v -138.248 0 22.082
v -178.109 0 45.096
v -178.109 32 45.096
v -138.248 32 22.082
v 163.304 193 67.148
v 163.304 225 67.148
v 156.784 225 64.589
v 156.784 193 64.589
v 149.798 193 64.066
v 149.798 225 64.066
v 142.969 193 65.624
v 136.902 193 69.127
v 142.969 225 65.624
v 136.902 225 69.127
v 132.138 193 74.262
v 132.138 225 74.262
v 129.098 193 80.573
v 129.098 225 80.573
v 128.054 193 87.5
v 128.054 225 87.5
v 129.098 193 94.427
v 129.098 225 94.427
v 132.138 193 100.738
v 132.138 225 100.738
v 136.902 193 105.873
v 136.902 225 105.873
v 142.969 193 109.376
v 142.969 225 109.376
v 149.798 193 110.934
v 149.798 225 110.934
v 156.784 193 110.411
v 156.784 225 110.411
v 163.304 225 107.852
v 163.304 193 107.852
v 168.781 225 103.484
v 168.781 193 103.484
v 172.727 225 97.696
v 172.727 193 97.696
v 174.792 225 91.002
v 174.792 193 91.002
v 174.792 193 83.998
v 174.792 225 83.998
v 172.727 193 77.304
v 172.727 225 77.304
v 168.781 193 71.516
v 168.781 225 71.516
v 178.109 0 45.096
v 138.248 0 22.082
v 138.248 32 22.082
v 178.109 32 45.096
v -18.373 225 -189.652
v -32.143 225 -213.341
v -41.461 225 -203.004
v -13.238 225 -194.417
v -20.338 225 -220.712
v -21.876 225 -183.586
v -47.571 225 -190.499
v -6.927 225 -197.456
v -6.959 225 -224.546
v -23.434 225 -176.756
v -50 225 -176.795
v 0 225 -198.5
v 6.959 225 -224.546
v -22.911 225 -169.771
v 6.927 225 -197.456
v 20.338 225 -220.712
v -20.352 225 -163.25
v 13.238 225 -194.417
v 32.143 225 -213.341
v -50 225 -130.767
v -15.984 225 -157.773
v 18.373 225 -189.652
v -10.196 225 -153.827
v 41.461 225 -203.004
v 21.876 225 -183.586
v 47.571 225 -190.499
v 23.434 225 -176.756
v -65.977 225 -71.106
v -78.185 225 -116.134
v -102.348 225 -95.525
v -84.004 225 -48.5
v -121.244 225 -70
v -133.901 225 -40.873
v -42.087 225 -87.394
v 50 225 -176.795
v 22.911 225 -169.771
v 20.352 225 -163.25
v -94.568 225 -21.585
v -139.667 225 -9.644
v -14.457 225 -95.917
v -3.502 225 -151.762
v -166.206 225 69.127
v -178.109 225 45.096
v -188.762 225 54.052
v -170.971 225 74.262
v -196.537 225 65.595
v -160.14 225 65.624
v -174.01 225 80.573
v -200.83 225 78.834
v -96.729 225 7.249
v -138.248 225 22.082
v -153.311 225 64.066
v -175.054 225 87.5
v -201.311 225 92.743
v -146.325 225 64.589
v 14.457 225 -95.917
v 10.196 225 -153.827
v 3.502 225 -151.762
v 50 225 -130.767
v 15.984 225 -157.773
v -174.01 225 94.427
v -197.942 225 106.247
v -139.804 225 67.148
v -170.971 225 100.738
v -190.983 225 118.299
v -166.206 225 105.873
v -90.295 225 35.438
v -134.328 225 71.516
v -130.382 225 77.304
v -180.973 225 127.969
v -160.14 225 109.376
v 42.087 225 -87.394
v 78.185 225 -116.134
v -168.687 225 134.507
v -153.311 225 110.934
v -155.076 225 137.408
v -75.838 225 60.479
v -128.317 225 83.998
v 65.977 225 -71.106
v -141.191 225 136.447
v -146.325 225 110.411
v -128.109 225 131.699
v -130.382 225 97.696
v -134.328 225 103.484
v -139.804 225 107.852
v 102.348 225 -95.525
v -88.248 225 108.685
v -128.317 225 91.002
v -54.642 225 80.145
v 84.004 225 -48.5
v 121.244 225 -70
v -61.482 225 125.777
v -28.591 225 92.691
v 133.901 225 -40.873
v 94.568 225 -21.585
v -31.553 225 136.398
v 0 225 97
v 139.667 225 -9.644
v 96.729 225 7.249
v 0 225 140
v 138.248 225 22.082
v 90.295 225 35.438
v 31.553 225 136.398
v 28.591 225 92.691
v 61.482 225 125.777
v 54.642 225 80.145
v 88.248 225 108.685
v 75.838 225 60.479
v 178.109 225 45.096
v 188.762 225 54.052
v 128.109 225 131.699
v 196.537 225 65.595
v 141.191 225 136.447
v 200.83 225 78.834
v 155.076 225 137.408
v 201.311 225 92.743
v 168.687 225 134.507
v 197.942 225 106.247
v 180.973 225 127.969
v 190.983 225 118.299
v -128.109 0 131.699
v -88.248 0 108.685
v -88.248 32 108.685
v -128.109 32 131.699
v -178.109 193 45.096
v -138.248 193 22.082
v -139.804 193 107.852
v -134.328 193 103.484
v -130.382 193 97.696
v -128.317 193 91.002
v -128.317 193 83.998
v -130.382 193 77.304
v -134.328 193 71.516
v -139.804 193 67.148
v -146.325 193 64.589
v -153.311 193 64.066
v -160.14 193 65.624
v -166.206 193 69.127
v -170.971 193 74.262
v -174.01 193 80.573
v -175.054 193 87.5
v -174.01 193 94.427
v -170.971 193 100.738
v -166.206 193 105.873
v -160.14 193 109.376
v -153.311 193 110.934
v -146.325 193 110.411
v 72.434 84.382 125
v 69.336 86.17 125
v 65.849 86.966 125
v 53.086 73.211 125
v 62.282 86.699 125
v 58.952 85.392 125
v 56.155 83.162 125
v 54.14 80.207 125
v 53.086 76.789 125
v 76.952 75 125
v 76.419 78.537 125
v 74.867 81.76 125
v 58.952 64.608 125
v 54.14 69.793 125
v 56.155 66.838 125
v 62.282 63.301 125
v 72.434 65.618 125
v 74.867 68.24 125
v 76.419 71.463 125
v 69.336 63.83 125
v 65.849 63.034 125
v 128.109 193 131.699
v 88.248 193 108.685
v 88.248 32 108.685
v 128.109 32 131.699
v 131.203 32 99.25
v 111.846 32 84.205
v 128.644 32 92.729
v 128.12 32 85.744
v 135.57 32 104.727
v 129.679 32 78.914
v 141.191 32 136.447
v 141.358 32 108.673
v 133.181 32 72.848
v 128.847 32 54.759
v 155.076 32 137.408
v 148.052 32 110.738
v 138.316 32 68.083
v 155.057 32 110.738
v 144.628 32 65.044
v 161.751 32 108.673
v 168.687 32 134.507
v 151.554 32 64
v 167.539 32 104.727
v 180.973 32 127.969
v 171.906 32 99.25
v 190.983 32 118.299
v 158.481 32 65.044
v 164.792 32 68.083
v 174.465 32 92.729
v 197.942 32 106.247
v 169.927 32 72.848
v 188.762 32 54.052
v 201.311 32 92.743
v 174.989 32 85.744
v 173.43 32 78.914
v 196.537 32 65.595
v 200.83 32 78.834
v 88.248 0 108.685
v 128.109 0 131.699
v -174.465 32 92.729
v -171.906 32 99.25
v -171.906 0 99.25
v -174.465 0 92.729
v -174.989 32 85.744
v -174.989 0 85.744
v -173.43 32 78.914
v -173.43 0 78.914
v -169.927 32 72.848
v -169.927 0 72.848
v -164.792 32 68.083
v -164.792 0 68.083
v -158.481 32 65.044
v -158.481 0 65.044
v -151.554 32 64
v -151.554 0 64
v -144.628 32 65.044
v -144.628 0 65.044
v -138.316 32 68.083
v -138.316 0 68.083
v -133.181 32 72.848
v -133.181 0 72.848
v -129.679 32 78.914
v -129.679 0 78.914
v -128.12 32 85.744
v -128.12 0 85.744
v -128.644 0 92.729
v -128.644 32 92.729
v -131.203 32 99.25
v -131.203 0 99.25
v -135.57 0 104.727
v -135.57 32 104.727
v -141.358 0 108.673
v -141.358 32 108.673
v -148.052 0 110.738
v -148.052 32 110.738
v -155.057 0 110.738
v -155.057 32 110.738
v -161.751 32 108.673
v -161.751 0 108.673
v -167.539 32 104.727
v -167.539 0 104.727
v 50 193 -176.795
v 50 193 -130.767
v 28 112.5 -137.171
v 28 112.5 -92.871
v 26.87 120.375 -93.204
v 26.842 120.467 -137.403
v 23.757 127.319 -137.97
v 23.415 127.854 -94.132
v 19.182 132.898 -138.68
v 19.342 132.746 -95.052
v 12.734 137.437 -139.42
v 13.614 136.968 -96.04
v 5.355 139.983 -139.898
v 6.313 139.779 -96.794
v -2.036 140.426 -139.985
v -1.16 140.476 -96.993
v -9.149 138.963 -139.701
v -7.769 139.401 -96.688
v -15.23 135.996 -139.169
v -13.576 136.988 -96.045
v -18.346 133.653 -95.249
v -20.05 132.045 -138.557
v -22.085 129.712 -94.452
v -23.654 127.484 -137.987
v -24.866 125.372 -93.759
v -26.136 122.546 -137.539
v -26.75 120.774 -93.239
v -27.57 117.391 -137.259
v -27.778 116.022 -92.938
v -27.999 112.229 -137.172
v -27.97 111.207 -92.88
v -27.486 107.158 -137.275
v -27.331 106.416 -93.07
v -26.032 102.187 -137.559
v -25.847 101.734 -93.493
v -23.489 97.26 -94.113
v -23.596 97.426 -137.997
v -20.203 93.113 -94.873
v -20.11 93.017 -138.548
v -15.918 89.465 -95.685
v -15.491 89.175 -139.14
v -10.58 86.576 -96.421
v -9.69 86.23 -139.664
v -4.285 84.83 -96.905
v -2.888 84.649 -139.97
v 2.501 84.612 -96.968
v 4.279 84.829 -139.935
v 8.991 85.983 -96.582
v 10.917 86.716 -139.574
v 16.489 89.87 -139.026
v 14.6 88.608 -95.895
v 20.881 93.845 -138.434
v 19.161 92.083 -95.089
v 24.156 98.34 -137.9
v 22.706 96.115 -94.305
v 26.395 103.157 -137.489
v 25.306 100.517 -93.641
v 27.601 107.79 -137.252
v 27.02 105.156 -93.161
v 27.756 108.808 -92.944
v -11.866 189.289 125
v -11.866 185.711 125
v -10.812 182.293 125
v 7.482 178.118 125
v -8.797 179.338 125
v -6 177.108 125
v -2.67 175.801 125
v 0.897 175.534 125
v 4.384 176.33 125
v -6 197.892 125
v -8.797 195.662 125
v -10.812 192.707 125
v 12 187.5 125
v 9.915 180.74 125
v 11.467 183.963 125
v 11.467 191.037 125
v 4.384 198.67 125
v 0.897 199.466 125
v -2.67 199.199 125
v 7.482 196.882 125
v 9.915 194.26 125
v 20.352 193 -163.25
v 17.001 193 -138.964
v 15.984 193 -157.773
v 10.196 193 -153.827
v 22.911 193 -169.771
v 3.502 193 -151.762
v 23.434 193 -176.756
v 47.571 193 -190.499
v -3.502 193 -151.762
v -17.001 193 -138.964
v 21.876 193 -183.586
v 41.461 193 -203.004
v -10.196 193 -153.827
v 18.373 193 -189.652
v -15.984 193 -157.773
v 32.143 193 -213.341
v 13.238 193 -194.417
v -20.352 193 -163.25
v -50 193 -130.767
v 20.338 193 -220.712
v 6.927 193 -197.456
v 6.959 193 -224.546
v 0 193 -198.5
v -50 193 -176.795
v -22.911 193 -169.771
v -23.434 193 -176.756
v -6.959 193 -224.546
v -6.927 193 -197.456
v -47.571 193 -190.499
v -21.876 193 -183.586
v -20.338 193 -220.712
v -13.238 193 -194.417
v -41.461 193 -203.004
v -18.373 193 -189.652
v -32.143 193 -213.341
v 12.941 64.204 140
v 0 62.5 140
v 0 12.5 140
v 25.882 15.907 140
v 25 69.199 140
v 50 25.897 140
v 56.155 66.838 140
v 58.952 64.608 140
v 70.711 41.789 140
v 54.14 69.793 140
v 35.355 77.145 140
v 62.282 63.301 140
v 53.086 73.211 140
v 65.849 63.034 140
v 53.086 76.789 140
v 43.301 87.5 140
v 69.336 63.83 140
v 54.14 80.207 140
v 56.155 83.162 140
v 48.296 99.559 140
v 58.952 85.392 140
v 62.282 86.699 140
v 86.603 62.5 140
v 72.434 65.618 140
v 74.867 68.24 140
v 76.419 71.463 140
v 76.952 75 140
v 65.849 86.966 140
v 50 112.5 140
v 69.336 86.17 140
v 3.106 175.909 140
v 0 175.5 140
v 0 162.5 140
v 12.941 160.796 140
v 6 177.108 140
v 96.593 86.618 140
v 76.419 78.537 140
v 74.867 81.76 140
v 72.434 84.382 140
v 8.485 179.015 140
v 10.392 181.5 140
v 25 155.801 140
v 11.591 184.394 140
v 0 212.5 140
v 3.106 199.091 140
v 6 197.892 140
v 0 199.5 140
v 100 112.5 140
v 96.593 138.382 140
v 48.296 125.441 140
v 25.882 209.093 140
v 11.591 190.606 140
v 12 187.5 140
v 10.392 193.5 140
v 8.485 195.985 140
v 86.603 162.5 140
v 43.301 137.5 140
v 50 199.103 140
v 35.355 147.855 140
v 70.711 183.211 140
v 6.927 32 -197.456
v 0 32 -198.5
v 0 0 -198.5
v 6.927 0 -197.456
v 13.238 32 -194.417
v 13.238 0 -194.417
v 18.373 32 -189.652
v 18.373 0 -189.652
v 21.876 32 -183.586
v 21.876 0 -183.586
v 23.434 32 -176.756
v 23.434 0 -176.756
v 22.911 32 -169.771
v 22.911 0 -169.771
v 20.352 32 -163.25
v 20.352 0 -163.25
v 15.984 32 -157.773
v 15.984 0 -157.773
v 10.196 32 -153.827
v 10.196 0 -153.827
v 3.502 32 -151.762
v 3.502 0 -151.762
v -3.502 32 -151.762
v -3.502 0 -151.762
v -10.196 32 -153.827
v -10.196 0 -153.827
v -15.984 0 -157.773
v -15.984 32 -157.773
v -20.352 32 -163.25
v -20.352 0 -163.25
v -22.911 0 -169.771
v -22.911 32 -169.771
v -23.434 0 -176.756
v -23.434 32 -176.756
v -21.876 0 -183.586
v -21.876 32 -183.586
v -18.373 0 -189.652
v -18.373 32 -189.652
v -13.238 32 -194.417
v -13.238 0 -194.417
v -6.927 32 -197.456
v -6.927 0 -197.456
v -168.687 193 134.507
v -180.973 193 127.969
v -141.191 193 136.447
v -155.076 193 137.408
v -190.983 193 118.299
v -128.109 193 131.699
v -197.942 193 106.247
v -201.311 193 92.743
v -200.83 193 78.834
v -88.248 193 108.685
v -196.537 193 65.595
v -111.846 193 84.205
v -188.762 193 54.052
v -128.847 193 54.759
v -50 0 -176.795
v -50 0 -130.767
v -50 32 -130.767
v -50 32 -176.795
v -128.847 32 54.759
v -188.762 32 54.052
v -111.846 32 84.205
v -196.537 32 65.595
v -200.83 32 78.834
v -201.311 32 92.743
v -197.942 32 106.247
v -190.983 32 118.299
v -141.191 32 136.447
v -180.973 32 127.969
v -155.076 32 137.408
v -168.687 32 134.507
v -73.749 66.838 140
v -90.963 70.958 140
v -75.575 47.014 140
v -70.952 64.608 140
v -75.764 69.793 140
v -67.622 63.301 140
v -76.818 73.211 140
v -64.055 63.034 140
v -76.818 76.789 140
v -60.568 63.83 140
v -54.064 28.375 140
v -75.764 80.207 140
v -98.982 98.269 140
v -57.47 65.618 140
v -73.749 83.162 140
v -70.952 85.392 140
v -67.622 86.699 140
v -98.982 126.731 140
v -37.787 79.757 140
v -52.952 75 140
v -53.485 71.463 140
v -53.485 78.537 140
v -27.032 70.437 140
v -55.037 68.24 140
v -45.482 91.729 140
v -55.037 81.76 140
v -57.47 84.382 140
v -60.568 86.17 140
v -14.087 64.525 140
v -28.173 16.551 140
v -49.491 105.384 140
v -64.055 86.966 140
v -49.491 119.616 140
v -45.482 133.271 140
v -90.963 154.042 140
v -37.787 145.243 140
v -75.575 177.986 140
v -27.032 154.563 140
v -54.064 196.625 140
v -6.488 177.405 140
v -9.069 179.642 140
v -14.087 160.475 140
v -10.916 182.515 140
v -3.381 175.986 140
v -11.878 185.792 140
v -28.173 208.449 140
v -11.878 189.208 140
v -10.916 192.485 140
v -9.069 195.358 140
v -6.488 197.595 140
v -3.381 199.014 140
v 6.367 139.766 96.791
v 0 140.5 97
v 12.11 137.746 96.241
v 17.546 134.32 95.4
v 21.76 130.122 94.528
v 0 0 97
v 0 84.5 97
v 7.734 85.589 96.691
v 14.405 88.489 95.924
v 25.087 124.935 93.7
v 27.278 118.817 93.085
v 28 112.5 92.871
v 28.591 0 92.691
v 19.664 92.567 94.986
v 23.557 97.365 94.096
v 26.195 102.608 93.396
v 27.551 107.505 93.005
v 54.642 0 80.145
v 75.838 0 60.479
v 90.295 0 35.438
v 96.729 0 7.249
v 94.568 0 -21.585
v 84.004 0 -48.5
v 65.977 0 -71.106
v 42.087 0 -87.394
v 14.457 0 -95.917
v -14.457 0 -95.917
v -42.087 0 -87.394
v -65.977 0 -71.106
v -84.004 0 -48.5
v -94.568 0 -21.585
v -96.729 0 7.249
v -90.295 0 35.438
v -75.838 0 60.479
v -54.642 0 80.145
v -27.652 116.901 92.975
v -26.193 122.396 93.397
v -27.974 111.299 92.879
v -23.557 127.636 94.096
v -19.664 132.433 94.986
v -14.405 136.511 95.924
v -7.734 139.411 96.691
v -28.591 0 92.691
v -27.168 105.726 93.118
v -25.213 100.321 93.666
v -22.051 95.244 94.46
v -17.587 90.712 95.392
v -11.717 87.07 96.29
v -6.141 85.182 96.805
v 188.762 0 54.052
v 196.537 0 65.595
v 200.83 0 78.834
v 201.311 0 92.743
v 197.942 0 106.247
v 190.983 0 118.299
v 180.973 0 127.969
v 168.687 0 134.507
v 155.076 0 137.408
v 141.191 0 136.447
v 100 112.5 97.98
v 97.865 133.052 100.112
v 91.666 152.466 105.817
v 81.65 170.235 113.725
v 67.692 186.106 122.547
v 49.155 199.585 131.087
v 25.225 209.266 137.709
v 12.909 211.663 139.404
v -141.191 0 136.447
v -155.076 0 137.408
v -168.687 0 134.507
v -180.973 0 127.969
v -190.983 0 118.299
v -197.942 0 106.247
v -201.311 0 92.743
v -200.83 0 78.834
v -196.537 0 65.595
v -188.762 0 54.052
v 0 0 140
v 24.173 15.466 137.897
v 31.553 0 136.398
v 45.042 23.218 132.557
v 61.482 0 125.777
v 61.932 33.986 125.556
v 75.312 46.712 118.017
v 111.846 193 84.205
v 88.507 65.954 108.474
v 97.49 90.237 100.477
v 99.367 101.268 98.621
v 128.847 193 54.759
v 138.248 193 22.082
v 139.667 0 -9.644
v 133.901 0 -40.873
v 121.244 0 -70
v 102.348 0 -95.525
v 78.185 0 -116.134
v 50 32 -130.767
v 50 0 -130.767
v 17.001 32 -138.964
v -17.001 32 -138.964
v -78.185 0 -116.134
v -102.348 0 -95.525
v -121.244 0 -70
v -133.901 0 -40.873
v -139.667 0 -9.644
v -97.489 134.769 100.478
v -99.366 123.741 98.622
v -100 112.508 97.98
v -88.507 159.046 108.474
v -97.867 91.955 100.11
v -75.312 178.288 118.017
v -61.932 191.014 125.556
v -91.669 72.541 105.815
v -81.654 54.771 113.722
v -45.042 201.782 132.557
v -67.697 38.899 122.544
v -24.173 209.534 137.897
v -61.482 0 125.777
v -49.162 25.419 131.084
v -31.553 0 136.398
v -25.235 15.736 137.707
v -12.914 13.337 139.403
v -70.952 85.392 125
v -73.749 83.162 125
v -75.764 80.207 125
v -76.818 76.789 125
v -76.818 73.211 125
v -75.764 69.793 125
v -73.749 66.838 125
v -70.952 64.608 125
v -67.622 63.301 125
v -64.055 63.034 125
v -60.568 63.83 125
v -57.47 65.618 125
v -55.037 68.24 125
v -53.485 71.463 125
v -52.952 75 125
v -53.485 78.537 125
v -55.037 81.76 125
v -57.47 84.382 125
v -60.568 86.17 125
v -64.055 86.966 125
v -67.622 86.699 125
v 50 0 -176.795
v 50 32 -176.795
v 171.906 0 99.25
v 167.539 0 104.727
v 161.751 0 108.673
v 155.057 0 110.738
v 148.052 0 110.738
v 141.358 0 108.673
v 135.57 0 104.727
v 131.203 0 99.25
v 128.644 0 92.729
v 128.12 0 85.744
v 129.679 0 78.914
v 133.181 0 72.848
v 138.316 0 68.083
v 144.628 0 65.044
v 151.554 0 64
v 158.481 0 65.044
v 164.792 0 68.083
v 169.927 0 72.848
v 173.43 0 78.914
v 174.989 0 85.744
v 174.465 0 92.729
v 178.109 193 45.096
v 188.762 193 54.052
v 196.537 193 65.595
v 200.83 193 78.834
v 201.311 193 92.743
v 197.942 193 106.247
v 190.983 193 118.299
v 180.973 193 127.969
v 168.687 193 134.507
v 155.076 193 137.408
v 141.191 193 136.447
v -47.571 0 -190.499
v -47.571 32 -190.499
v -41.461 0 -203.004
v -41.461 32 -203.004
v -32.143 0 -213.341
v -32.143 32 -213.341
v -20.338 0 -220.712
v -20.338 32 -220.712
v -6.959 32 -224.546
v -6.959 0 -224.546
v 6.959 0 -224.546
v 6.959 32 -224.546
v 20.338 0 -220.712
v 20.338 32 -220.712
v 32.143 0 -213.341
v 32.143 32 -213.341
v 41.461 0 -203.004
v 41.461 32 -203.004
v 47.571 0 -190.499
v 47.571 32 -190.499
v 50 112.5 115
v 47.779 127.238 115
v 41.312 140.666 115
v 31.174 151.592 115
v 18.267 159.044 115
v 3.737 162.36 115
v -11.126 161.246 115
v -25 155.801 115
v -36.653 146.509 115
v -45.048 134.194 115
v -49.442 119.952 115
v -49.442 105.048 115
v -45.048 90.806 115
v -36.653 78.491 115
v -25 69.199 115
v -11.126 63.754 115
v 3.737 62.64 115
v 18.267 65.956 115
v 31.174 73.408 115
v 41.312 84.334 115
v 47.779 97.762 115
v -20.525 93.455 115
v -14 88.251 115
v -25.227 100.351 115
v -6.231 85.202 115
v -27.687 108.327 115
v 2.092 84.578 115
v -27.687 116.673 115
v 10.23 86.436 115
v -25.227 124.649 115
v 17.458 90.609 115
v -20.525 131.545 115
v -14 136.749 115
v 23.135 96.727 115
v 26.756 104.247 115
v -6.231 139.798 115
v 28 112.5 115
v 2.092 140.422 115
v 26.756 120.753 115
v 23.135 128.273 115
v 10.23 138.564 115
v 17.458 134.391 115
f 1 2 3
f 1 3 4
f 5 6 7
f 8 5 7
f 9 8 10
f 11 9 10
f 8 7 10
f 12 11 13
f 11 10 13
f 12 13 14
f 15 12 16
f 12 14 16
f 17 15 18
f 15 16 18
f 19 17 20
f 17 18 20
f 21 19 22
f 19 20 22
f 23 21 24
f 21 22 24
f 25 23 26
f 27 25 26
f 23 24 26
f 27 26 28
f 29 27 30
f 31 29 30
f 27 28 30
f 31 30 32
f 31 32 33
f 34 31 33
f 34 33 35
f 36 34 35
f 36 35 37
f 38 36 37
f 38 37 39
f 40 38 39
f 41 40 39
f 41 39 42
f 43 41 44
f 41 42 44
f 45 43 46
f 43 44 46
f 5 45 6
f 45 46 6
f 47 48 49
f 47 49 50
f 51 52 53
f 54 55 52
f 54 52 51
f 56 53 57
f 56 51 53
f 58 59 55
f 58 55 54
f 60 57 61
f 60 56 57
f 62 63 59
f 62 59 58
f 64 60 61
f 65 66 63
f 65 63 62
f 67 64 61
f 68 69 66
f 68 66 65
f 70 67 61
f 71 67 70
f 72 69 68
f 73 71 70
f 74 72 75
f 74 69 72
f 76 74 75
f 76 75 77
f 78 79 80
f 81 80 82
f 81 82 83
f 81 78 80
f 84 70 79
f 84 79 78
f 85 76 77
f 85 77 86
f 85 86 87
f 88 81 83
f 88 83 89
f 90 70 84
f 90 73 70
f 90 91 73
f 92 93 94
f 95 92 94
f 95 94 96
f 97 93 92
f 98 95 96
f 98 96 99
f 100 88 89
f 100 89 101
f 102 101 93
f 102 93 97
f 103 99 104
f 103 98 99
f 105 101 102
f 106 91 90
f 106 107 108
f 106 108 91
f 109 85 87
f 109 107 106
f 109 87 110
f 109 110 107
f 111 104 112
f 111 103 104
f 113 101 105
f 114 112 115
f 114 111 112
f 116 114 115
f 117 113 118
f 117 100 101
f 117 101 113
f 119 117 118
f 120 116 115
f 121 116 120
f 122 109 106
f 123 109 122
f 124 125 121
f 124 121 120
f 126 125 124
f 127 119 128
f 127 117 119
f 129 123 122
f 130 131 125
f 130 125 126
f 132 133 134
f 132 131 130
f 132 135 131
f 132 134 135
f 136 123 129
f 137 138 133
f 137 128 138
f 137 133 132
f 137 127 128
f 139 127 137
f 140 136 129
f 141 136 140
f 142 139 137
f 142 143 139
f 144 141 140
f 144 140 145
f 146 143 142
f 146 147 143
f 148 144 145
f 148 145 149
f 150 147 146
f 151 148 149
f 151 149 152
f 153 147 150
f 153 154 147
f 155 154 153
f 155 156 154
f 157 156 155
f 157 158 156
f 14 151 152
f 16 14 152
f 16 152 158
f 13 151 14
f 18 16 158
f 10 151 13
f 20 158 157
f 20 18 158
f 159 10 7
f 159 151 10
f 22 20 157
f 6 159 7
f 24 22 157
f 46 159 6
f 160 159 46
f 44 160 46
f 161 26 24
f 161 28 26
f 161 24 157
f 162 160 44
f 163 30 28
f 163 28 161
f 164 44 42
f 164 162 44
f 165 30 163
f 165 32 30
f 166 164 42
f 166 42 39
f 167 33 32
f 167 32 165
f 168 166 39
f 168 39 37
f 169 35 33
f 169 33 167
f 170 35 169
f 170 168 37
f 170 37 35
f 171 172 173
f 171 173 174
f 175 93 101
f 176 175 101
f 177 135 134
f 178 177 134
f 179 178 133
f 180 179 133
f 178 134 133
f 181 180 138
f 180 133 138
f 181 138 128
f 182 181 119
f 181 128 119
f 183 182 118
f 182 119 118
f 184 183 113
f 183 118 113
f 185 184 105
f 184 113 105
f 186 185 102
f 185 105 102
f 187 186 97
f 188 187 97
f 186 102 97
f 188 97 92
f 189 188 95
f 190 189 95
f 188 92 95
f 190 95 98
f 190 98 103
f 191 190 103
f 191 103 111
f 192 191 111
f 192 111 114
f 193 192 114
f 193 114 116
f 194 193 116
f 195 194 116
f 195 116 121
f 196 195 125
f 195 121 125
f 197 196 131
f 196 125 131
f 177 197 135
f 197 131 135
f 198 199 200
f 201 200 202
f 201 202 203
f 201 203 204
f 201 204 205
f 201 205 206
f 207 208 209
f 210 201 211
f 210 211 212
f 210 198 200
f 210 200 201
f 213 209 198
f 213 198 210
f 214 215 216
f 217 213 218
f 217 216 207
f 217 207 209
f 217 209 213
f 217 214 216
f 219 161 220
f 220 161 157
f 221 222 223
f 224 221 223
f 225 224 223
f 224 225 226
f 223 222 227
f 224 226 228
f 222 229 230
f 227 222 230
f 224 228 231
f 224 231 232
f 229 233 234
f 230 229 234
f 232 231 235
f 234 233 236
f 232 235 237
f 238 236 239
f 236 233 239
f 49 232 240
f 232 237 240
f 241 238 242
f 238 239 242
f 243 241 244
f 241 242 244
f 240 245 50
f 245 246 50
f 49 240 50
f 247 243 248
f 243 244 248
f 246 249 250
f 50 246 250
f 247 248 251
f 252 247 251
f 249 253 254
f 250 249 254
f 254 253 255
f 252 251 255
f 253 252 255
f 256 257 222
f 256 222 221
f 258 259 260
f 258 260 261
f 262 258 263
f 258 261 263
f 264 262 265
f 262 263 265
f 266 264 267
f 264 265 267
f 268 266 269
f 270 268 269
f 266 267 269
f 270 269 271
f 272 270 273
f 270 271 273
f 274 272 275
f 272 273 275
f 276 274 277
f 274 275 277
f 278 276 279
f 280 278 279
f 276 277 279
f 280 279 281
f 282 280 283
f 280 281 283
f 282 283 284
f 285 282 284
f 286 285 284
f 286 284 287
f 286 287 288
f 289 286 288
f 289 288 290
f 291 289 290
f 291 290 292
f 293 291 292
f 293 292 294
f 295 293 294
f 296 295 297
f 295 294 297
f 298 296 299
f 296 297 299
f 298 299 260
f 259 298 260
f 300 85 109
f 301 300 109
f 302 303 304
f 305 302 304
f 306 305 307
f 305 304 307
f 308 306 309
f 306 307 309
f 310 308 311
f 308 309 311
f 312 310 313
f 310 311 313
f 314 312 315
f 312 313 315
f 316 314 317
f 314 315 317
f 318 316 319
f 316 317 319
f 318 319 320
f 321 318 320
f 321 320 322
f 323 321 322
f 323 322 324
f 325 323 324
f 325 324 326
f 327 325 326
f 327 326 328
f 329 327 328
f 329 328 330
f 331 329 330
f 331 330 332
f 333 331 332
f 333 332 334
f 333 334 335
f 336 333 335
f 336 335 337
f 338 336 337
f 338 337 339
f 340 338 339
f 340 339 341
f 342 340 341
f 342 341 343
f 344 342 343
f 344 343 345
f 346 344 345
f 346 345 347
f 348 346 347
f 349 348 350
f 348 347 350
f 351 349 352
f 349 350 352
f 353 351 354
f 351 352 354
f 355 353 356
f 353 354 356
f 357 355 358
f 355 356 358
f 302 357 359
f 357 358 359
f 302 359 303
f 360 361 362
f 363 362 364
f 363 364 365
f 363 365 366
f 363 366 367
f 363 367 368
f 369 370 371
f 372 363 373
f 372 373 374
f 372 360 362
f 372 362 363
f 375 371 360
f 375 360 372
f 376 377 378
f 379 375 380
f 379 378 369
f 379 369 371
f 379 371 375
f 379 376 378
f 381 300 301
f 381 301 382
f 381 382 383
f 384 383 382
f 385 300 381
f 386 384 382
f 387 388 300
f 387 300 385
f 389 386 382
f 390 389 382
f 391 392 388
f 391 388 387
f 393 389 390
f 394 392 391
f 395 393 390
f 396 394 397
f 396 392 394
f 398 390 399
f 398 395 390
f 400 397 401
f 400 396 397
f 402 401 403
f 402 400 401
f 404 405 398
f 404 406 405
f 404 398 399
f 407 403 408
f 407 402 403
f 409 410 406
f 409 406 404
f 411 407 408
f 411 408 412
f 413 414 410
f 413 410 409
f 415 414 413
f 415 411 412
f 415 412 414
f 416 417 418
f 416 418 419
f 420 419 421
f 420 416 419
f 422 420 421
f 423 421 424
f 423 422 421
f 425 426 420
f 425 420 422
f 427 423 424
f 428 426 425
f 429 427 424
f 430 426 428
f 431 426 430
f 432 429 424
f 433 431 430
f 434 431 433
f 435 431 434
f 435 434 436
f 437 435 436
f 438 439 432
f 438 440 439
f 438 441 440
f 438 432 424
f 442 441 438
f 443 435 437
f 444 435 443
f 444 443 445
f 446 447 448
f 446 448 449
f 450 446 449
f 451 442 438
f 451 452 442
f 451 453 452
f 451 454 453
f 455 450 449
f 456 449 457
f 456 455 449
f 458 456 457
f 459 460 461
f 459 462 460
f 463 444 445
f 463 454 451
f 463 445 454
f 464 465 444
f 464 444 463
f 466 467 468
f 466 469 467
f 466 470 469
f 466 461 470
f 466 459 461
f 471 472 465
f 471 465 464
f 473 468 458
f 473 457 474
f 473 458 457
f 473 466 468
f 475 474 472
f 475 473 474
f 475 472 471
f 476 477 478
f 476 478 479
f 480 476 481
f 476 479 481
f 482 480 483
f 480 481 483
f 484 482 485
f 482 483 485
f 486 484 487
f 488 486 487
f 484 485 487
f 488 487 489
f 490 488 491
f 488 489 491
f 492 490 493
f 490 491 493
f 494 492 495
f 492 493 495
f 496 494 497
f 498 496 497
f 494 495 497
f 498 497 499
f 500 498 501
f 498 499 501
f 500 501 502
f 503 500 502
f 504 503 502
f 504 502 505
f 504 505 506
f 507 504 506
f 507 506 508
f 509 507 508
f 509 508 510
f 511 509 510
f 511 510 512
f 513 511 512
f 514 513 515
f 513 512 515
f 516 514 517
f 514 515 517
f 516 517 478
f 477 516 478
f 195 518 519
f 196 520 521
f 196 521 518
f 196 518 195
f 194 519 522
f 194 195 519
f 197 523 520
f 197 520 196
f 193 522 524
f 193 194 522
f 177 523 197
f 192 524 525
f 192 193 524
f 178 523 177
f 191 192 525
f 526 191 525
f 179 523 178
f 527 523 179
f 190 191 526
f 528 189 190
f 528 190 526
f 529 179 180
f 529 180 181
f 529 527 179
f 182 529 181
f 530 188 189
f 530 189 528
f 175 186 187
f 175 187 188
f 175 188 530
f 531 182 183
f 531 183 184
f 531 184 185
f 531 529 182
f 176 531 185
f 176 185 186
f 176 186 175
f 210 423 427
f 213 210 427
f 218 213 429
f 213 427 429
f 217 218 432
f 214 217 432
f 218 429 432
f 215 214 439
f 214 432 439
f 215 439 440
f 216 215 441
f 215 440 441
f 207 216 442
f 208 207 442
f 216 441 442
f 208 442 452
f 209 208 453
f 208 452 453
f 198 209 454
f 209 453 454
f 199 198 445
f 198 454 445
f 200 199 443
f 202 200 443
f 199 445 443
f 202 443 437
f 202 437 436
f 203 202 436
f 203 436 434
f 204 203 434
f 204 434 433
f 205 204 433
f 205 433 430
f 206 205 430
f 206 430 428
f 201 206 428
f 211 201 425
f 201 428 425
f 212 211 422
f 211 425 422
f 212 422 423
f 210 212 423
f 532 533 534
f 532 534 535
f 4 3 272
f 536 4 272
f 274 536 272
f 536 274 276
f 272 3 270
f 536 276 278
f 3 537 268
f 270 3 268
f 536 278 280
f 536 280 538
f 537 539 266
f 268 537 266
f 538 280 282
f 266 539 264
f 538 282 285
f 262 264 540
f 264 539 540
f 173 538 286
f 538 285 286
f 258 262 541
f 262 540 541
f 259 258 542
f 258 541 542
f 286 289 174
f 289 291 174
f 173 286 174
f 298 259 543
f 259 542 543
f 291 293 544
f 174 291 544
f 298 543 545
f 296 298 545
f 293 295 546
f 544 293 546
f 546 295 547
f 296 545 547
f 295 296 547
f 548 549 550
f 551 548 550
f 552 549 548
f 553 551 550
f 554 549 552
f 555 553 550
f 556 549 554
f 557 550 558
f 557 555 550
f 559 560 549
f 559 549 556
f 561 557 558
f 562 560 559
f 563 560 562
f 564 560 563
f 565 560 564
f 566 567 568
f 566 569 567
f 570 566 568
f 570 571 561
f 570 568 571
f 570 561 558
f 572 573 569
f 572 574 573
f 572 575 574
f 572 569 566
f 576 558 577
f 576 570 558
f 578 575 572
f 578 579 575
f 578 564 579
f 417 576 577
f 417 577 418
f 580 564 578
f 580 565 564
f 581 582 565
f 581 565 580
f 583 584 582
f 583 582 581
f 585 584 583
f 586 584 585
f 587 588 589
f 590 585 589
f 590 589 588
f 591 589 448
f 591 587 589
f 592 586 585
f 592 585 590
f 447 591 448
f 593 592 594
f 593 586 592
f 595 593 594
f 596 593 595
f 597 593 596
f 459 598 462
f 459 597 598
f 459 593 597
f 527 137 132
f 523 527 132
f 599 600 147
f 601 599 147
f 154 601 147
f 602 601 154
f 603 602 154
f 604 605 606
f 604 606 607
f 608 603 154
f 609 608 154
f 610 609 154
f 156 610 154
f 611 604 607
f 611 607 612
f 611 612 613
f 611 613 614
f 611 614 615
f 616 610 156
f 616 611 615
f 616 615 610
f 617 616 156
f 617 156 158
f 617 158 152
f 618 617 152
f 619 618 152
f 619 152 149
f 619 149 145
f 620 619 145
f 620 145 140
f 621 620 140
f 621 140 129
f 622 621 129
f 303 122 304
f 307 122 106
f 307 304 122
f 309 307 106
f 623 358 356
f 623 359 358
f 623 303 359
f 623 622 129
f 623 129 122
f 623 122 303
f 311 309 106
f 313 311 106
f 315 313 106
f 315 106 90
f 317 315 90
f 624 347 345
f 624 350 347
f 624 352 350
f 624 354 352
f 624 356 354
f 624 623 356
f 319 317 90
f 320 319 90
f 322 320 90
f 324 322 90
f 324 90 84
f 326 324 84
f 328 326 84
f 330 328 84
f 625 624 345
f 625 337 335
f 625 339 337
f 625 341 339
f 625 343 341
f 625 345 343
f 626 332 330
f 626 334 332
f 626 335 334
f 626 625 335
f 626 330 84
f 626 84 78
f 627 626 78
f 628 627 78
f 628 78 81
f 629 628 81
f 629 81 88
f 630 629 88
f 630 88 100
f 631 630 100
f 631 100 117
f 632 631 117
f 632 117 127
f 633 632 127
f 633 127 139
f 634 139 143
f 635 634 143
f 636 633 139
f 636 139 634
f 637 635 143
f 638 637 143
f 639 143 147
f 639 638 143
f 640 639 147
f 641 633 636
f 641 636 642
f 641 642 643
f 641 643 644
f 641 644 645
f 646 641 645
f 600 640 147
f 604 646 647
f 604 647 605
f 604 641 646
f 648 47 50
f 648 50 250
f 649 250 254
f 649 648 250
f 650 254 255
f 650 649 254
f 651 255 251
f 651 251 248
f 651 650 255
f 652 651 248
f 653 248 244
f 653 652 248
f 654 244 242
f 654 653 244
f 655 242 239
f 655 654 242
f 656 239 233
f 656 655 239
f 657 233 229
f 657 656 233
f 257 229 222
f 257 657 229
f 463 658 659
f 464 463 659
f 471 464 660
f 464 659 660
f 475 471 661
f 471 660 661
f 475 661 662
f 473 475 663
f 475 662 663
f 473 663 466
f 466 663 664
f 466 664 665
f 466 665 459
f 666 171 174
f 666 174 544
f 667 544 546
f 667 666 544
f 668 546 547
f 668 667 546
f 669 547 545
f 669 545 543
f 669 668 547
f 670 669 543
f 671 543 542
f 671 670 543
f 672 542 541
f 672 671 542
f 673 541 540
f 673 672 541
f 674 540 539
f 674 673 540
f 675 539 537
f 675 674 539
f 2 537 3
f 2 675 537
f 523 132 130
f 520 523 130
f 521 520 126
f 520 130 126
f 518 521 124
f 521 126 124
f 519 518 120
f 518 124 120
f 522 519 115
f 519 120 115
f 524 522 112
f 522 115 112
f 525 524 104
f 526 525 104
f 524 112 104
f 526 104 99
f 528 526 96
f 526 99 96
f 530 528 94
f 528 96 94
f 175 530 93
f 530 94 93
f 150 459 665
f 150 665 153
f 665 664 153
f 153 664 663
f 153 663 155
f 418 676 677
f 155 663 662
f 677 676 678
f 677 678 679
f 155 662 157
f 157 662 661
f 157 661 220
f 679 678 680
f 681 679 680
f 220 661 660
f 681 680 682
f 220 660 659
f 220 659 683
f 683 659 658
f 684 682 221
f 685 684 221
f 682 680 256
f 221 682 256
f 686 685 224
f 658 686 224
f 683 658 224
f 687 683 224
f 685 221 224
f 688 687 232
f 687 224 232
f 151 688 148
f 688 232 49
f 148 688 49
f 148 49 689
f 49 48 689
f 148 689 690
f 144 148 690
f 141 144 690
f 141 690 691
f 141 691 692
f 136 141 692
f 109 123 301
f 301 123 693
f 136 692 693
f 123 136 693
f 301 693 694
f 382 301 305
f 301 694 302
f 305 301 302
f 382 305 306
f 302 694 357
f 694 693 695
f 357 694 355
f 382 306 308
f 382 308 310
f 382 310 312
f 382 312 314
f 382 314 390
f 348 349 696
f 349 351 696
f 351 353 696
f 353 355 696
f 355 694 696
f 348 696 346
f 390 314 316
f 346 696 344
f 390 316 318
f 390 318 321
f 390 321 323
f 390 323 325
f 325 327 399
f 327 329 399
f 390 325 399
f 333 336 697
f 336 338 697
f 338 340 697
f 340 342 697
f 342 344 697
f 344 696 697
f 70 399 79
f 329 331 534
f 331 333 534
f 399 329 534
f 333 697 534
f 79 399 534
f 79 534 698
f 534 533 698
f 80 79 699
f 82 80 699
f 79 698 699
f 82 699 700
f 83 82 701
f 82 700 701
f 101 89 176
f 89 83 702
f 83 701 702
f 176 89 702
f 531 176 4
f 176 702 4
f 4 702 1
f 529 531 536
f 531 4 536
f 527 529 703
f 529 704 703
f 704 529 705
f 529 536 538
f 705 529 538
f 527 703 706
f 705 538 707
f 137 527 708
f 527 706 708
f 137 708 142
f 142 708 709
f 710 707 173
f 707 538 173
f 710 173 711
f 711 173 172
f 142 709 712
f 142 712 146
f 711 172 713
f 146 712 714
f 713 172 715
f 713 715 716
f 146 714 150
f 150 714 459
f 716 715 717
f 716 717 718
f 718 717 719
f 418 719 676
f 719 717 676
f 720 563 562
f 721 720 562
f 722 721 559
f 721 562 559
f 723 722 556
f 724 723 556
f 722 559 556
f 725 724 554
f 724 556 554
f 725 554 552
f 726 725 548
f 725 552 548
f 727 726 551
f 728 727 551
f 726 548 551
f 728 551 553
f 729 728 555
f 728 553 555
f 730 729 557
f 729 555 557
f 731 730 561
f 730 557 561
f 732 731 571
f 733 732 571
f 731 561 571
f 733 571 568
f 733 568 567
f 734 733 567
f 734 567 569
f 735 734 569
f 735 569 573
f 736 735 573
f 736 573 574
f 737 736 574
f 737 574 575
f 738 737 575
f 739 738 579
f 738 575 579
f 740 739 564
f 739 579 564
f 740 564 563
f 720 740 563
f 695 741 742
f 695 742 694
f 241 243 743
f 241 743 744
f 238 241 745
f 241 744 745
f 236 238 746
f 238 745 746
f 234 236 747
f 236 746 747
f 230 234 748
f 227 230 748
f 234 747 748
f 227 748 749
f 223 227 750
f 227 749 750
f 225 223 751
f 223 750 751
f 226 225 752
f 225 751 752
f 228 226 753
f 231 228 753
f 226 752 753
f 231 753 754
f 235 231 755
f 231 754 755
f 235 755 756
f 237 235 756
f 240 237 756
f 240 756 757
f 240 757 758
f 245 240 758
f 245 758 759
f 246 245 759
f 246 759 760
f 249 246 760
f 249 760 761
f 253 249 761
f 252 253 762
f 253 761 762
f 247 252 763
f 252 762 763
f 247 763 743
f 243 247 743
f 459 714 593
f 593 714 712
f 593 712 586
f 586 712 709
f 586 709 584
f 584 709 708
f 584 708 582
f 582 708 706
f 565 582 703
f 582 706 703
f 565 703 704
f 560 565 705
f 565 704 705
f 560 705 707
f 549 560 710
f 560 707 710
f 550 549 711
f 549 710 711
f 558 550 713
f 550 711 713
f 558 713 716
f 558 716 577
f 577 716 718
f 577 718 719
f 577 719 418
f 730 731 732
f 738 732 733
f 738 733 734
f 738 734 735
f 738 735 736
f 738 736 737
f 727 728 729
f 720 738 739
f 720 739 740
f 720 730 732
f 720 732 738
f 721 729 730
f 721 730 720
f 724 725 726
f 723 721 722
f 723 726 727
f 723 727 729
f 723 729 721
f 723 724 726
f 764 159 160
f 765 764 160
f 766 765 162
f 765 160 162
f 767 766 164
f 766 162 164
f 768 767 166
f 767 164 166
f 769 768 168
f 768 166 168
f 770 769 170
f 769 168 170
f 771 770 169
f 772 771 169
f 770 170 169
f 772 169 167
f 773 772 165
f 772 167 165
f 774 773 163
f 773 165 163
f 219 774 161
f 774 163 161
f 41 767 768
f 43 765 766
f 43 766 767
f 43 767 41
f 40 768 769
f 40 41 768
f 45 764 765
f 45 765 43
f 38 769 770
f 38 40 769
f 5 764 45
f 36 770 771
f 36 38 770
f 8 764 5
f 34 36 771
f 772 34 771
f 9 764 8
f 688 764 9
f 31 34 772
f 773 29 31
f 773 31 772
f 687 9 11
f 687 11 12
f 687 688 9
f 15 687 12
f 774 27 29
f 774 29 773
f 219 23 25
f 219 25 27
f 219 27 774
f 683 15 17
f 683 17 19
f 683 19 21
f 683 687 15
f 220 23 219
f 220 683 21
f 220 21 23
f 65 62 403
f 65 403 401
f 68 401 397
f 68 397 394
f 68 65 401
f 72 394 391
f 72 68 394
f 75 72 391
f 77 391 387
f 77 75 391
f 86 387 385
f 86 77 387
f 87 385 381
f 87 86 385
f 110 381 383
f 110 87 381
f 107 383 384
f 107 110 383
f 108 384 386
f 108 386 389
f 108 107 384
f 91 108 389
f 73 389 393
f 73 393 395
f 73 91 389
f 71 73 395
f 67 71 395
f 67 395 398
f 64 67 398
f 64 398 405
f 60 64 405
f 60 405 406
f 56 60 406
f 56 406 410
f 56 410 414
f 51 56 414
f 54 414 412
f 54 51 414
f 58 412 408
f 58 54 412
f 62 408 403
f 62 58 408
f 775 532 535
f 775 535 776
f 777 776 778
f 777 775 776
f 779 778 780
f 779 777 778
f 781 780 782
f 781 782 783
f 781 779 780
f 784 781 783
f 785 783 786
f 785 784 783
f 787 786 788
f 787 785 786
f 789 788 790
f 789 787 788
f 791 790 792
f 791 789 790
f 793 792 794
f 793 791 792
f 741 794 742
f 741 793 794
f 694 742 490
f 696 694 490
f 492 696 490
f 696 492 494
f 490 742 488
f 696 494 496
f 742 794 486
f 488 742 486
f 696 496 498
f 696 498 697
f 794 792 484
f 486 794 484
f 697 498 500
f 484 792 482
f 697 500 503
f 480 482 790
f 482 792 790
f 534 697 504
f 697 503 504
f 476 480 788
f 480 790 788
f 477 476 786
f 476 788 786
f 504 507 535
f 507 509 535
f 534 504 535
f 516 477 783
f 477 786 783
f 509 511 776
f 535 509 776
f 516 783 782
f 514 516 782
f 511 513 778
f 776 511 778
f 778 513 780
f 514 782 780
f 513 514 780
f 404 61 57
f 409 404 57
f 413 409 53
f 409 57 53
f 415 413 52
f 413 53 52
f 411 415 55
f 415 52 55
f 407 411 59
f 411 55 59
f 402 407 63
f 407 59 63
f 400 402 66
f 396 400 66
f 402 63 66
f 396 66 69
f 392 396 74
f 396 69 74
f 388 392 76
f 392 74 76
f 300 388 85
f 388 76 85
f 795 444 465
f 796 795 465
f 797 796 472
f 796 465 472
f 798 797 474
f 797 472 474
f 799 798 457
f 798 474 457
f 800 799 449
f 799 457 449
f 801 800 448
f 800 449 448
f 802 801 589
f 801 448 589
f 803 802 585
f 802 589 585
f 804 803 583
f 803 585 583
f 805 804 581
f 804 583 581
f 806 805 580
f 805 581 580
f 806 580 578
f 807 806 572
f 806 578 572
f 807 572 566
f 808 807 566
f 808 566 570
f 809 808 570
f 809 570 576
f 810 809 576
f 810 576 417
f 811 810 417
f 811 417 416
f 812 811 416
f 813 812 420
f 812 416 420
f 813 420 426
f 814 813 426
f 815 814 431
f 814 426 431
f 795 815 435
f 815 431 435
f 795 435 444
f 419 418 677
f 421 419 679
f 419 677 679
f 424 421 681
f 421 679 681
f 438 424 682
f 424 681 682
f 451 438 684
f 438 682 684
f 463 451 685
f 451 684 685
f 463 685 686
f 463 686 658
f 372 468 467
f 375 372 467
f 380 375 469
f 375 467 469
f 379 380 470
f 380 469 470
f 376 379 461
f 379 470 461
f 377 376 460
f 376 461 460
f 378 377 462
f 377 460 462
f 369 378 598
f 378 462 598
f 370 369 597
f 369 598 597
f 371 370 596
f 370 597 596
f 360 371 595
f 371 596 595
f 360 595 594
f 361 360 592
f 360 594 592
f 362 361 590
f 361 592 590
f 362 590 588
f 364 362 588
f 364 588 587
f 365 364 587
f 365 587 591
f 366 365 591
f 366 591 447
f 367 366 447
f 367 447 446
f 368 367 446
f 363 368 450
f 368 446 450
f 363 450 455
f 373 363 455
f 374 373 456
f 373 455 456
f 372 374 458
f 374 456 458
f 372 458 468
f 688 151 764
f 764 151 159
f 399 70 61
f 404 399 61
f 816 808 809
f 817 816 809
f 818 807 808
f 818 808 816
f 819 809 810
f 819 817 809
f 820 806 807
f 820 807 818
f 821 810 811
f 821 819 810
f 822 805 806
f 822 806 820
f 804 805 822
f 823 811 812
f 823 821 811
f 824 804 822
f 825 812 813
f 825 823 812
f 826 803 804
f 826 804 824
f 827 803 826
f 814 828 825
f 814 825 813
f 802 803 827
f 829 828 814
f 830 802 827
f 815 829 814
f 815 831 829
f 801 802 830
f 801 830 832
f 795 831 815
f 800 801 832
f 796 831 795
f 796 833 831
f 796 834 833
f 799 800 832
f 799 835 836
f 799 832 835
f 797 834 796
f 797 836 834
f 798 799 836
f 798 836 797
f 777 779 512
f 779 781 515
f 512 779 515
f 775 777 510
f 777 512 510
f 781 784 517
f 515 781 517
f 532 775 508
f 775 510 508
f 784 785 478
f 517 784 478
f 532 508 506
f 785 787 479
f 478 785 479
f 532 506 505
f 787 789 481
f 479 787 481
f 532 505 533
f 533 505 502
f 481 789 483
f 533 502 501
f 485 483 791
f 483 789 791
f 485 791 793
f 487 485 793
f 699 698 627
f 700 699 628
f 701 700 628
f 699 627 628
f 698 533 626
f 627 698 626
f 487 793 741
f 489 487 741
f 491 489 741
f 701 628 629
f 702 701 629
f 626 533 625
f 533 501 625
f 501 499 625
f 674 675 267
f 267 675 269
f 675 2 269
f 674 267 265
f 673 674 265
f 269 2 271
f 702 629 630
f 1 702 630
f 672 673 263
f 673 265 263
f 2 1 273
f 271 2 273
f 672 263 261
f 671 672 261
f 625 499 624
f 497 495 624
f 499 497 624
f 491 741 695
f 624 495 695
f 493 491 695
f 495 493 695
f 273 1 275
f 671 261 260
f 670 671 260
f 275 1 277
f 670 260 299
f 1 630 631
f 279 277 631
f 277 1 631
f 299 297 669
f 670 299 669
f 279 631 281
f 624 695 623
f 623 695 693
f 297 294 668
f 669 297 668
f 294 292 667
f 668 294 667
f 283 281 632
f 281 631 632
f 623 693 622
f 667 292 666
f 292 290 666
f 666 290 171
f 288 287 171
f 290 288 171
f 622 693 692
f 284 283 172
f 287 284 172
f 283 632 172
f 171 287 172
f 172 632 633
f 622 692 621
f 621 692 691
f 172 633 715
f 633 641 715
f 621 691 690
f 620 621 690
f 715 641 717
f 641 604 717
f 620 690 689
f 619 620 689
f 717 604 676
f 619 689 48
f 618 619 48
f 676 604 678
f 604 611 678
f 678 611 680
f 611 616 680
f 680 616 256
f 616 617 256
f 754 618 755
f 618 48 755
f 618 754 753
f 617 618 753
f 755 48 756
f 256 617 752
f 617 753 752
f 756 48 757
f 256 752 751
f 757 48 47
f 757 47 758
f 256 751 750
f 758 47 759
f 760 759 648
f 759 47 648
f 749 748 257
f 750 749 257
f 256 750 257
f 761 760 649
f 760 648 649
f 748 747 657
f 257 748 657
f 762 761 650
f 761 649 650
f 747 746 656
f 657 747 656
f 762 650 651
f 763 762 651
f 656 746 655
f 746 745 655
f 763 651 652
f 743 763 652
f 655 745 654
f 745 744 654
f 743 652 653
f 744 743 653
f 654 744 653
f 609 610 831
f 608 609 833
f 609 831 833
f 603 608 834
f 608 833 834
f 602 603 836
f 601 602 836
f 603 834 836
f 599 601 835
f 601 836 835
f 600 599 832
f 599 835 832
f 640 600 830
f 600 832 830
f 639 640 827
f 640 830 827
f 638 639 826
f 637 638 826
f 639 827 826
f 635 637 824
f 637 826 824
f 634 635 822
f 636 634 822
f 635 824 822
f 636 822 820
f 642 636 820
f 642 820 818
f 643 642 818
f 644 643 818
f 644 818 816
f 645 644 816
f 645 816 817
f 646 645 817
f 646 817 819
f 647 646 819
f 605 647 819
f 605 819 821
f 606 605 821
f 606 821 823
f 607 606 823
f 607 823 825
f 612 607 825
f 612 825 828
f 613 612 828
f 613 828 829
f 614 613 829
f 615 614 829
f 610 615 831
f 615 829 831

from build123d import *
from build123d.topology import SkipClean

# Parameters (mm, degrees)
SKETCH1_R               = 140
SKETCH1_R_2             = 97
BOSS_EXTRUDE1_DEPTH     = 225
SKETCH5_R               = 23.5
BOSS_EXTRUDE2_DEPTH     = 32
CIRPATTERN1_COUNT       = 3
MIRROR1_COPY_1_SKETCH_R = 23.5
MIRROR1_COPY_1_DEPTH    = 32
MIRROR1_COPY_2_SKETCH_R = 23.5
MIRROR1_COPY_2_DEPTH    = 32
BOSS_EXTRUDE3_START     = -42.02041
SKETCH6_R               = 100
BOSS_EXTRUDE3_DEPTH     = 42.02041
SKETCH7_R               = 50
CUT_EXTRUDE1_DEPTH      = 25
SKETCH8_R               = 28
CUT_EXTRUDE2_DEPTH      = 455.845123838
SKETCH9_R               = 12
CUT_EXTRUDE3_DEPTH      = 15
CIRPATTERN2_COUNT       = 3


with BuildPart() as part:
    # Sketch1 → Boss-Extrude1 (new body)
    with BuildSketch(Plane(origin=(0, 0, 0), x_dir=(1, 0, 0), z_dir=(0, 1, 0))):
        with Locations(Location((0, 0, 0), (0, 0, 270))):
            Circle(SKETCH1_R)
        with Locations(Location((0, 0, 0), (0, 0, 270))):
            Circle(SKETCH1_R_2, mode=Mode.SUBTRACT)
    extrude(amount=BOSS_EXTRUDE1_DEPTH)

    # Sketch5 → Boss-Extrude2 (add)
    with BuildSketch(Plane(origin=(0, 0, 0), x_dir=(-1, 0, 0), z_dir=(0, -1, 0))):
        with BuildLine():
            ThreePointArc((50, 176.795082097), (0, 225.032212821), (-50, 176.795082097))
            Line((-50, 176.795082097), (-50, 173.204917903))
            Line((-50, 173.204917903), (-50, 130.766968306))
            ThreePointArc((-50, 130.766968306), (0, 140), (50, 130.766968306))
            Line((50, 130.766968306), (50, 173.204917903))
            Line((50, 173.204917903), (50, 176.795082097))
        make_face()
        with Locations(Location((0, 175, 0), (0, 0, 90))):
            Circle(SKETCH5_R, mode=Mode.SUBTRACT)
    boss_extrude2 = extrude(amount=-BOSS_EXTRUDE2_DEPTH)

    # CirPattern1: Boss-Extrude2 ×3 about axis
    cirpattern1_axis = Axis((0, 0, 0), (0, 1, 0))
    for i in range(1, CIRPATTERN1_COUNT):
        add(boss_extrude2.rotate(cirpattern1_axis, i * 360 / CIRPATTERN1_COUNT))

    # Mirror1: Boss-Extrude2 across plane
    add(boss_extrude2.mirror(Plane(origin=(0, 112.5, 0), x_dir=(0, 0, 1), z_dir=(0, -1, 0))))

    # Mirror1 copy 1 sketch → Mirror1 copy 1 (add)
    with BuildSketch(Plane(origin=(0, 225, 0), x_dir=(0.4999999999999998, 0, 0.8660254037844387), z_dir=(0, 1, 0))):
        with BuildLine():
            ThreePointArc((50, -176.795082097), (0, -225.032212821), (-50, -176.795082097))
            Line((-50, -176.795082097), (-50, -173.204917903))
            Line((-50, -173.204917903), (-50, -130.766968306))
            ThreePointArc((-50, -130.766968306), (0, -140), (50, -130.766968306))
            Line((50, -130.766968306), (50, -173.204917903))
            Line((50, -173.204917903), (50, -176.795082097))
        make_face()
        with Locations((0, -175)):
            Circle(MIRROR1_COPY_1_SKETCH_R, mode=Mode.SUBTRACT)
    extrude(amount=-MIRROR1_COPY_1_DEPTH)

    # Mirror1 copy 2 sketch → Mirror1 copy 2 (add)
    with BuildSketch(Plane(origin=(0, 225, 0), x_dir=(0.5000000000000004, 0, -0.8660254037844384), z_dir=(0, 1, 0))):
        with BuildLine():
            ThreePointArc((50, -176.795082097), (0, -225.032212821), (-50, -176.795082097))
            Line((-50, -176.795082097), (-50, -173.204917903))
            Line((-50, -173.204917903), (-50, -130.766968306))
            ThreePointArc((-50, -130.766968306), (0, -140), (50, -130.766968306))
            Line((50, -130.766968306), (50, -173.204917903))
            Line((50, -173.204917903), (50, -176.795082097))
        make_face()
        with Locations((0, -175)):
            Circle(MIRROR1_COPY_2_SKETCH_R, mode=Mode.SUBTRACT)
    extrude(amount=-MIRROR1_COPY_2_DEPTH)

    # Sketch6 → Boss-Extrude3 (add)
    with SkipClean():  # the faces are left unmerged after this step: merging them gives an invalid solid
        with BuildSketch(Plane.XY.offset(140).offset(BOSS_EXTRUDE3_START)):
            with Locations((0, 112.5)):
                Circle(SKETCH6_R)
        extrude(amount=BOSS_EXTRUDE3_DEPTH)

    # Sketch7 → Cut-Extrude1 (cut)
    with SkipClean():  # the faces are left unmerged after this step: merging them gives an invalid solid
        with BuildSketch(Plane.XY.offset(140)):
            with Locations((0, 112.5)):
                Circle(SKETCH7_R)
        extrude(amount=-CUT_EXTRUDE1_DEPTH, mode=Mode.SUBTRACT)

    # Sketch8 → Cut-Extrude2 (cut, through all)
    with SkipClean():  # the faces are left unmerged after this step: merging them gives an invalid solid
        with BuildSketch(Plane.XY.offset(115)):
            with Locations((0, 112.5)):
                Circle(SKETCH8_R)
        extrude(amount=-CUT_EXTRUDE2_DEPTH, mode=Mode.SUBTRACT)

    # Sketch9 → Cut-Extrude3 (cut)
    with SkipClean():  # the faces are left unmerged after this step: merging them gives an invalid solid
        with BuildSketch(Plane.XY.offset(140)):
            with Locations((0, 187.5)):
                Circle(SKETCH9_R)
        cut_extrude3 = extrude(amount=-CUT_EXTRUDE3_DEPTH, mode=Mode.SUBTRACT)

    # CirPattern2: Cut-Extrude3 ×3 about axis
    with SkipClean():  # the faces are left unmerged after this step: merging them gives an invalid solid
        cirpattern2_axis = Axis((0, 112.5, 0), (0, 0, 1))
        for i in range(1, CIRPATTERN2_COUNT):
            add(cut_extrude3.rotate(cirpattern2_axis, i * 360 / CIRPATTERN2_COUNT), mode=Mode.SUBTRACT)


solid = part.part
